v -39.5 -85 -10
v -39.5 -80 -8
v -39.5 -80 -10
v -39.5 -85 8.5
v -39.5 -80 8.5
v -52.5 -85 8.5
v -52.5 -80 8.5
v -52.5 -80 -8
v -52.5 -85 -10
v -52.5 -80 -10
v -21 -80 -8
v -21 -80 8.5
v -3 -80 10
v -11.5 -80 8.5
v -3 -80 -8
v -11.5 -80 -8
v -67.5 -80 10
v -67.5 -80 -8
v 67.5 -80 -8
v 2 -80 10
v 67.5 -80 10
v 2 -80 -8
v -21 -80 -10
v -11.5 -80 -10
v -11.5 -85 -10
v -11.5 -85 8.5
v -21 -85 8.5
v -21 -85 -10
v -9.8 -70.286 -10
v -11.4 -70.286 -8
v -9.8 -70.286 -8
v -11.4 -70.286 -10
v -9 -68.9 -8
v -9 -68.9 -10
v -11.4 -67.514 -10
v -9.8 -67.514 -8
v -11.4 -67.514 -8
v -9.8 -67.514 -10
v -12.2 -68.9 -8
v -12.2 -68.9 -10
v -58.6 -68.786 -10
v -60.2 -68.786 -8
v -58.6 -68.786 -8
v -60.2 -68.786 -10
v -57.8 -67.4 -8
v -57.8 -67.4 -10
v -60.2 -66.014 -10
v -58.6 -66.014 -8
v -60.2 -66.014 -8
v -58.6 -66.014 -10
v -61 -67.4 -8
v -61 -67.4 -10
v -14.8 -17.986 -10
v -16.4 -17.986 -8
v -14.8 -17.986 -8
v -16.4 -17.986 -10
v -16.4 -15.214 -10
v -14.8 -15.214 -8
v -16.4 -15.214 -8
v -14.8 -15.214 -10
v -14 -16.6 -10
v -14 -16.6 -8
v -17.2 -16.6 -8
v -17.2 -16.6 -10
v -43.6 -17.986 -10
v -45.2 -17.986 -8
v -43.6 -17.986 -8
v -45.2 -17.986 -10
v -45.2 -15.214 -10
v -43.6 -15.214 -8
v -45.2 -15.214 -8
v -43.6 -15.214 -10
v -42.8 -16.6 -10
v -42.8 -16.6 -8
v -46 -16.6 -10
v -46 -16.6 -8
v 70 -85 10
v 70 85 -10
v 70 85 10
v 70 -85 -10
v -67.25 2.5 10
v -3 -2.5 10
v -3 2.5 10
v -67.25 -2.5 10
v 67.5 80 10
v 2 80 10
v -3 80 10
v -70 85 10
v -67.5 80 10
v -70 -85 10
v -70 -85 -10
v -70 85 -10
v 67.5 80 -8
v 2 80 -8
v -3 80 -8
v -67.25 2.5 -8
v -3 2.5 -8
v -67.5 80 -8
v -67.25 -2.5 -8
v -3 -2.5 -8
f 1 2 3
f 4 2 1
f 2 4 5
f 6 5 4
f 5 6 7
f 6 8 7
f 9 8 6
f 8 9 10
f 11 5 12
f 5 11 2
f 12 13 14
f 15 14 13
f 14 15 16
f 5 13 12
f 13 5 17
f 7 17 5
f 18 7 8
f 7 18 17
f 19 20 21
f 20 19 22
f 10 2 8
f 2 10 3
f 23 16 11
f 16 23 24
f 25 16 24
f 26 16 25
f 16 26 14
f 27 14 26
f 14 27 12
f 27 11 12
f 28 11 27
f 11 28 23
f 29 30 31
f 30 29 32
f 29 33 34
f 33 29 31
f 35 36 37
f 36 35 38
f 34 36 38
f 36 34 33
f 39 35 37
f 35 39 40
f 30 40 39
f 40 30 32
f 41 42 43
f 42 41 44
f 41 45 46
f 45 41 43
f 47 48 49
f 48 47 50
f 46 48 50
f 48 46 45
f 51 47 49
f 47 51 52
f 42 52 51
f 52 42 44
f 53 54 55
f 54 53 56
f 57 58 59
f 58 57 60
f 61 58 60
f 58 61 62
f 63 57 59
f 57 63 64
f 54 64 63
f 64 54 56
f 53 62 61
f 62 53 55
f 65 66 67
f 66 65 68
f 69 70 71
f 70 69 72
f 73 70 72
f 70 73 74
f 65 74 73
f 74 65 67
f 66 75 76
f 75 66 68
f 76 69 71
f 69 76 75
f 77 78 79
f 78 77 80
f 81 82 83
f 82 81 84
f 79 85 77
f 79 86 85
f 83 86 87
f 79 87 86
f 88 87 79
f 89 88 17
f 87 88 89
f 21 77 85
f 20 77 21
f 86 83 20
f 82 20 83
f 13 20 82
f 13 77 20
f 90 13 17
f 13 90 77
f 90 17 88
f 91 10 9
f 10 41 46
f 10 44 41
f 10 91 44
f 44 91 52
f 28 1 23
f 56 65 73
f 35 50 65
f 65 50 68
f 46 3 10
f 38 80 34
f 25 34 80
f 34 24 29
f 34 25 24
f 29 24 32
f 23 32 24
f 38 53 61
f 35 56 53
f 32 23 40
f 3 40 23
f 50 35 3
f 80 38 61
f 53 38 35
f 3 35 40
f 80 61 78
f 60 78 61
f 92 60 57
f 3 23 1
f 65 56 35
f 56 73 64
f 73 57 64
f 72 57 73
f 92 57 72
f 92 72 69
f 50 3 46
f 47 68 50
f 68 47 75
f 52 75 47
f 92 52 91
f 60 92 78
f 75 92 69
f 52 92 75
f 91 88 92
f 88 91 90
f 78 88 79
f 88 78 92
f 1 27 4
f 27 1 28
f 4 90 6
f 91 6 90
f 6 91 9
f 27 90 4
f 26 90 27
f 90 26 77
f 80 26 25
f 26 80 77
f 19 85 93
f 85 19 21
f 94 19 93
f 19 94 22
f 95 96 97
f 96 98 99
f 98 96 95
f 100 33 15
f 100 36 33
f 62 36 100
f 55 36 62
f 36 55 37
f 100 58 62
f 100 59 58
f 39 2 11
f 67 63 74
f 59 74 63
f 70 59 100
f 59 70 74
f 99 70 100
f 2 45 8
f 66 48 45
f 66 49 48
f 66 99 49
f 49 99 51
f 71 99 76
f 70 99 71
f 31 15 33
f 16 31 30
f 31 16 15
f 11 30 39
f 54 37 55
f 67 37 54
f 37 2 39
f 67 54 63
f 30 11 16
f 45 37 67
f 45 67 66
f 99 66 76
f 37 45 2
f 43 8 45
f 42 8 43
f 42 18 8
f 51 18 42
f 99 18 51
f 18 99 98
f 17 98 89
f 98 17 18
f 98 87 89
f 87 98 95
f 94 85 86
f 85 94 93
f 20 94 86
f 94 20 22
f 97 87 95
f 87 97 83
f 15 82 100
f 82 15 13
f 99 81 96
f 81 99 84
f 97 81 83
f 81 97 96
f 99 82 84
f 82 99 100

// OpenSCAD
arduinoWidth = 54;
arduinoLength = 69;
arduinoUsbWidth = 13;
arduinoUsbHeight = 15;
arduinoUsbX = 9.5;
arduinoPowerWidth = 9.5;
arduinoPowerHeight = 15;
arduinoPowerX = 3.5;

breadboardWidth=56;
breadboardLength=165;
breadboardHeight=7;

wallThickness = 5;
wallHeight = 20;
bottomThickness = 2;

drill=3.2;

//whole box
difference()
{
    union()
    {
        cube([140, 170, 20], center=true);
    }
    
    translate([0, 0, 1])
       cube([135, 160, 18 ], center=true);
    
    translate([-35,-48.5, -0])
    {
        // USB hole
	translate([	-1*((arduinoWidth/2.0)-(arduinoUsbWidth/2.0)-arduinoUsbX),
			-1*(arduinoLength/2.0)-(wallThickness/2.0),
			-1*(wallHeight/2.0 - arduinoUsbHeight/2.0)+bottomThickness/2.0])
	{
		cube([arduinoUsbWidth, 11, wallHeight], center=true);
	}

	// Power hole
	translate([	((arduinoWidth/2.0)-(arduinoPowerWidth/2.0)-arduinoPowerX),
			-1*(arduinoLength/2.0)-(wallThickness/2.0),
			-1*(wallHeight/2.0 - arduinoPowerHeight/2.0)+bottomThickness/2.0])
	{
		cube([arduinoPowerWidth, 11,wallHeight], center=true);
	}
	
	// Drill holes
	
    translate ([arduinoWidth/2-drill/2-1,-arduinoLength/2+12.5+drill/2,0]) cylinder (r=drill/2, h=10*drill, center=true);
    
	translate ([-arduinoWidth/2+drill/2+1,-arduinoLength/2+14+drill/2,0]) cylinder (r=drill/2, h=10*drill, center=true);
    
	translate ([arduinoWidth/2-drill/2-6,+arduinoLength/2-1-drill/2,0]) cylinder (r=drill/2, h=10*drill, center=true);
    
	translate ([-arduinoWidth/2+drill/2+16,+arduinoLength/2-1-drill/2,0]) cylinder (r=drill/2, h=10*drill, center=true);}
        
    
    
}

//partition between arduino and compartment tray
translate([-35, 0, 0])
union()
{    
    cube([64.5, wallThickness, wallHeight], center=true);        
}


//section for breadboard

translate([3, -85, -10])
difference() 
{
      union() 
      {  
        translate([-6, 0, 0])
          cube([wallThickness, breadboardLength, wallHeight]);
      }
       
      translate([0, 0, 6])
        cube([breadboardWidth, breadboardLength, breadboardHeight]);  
};
